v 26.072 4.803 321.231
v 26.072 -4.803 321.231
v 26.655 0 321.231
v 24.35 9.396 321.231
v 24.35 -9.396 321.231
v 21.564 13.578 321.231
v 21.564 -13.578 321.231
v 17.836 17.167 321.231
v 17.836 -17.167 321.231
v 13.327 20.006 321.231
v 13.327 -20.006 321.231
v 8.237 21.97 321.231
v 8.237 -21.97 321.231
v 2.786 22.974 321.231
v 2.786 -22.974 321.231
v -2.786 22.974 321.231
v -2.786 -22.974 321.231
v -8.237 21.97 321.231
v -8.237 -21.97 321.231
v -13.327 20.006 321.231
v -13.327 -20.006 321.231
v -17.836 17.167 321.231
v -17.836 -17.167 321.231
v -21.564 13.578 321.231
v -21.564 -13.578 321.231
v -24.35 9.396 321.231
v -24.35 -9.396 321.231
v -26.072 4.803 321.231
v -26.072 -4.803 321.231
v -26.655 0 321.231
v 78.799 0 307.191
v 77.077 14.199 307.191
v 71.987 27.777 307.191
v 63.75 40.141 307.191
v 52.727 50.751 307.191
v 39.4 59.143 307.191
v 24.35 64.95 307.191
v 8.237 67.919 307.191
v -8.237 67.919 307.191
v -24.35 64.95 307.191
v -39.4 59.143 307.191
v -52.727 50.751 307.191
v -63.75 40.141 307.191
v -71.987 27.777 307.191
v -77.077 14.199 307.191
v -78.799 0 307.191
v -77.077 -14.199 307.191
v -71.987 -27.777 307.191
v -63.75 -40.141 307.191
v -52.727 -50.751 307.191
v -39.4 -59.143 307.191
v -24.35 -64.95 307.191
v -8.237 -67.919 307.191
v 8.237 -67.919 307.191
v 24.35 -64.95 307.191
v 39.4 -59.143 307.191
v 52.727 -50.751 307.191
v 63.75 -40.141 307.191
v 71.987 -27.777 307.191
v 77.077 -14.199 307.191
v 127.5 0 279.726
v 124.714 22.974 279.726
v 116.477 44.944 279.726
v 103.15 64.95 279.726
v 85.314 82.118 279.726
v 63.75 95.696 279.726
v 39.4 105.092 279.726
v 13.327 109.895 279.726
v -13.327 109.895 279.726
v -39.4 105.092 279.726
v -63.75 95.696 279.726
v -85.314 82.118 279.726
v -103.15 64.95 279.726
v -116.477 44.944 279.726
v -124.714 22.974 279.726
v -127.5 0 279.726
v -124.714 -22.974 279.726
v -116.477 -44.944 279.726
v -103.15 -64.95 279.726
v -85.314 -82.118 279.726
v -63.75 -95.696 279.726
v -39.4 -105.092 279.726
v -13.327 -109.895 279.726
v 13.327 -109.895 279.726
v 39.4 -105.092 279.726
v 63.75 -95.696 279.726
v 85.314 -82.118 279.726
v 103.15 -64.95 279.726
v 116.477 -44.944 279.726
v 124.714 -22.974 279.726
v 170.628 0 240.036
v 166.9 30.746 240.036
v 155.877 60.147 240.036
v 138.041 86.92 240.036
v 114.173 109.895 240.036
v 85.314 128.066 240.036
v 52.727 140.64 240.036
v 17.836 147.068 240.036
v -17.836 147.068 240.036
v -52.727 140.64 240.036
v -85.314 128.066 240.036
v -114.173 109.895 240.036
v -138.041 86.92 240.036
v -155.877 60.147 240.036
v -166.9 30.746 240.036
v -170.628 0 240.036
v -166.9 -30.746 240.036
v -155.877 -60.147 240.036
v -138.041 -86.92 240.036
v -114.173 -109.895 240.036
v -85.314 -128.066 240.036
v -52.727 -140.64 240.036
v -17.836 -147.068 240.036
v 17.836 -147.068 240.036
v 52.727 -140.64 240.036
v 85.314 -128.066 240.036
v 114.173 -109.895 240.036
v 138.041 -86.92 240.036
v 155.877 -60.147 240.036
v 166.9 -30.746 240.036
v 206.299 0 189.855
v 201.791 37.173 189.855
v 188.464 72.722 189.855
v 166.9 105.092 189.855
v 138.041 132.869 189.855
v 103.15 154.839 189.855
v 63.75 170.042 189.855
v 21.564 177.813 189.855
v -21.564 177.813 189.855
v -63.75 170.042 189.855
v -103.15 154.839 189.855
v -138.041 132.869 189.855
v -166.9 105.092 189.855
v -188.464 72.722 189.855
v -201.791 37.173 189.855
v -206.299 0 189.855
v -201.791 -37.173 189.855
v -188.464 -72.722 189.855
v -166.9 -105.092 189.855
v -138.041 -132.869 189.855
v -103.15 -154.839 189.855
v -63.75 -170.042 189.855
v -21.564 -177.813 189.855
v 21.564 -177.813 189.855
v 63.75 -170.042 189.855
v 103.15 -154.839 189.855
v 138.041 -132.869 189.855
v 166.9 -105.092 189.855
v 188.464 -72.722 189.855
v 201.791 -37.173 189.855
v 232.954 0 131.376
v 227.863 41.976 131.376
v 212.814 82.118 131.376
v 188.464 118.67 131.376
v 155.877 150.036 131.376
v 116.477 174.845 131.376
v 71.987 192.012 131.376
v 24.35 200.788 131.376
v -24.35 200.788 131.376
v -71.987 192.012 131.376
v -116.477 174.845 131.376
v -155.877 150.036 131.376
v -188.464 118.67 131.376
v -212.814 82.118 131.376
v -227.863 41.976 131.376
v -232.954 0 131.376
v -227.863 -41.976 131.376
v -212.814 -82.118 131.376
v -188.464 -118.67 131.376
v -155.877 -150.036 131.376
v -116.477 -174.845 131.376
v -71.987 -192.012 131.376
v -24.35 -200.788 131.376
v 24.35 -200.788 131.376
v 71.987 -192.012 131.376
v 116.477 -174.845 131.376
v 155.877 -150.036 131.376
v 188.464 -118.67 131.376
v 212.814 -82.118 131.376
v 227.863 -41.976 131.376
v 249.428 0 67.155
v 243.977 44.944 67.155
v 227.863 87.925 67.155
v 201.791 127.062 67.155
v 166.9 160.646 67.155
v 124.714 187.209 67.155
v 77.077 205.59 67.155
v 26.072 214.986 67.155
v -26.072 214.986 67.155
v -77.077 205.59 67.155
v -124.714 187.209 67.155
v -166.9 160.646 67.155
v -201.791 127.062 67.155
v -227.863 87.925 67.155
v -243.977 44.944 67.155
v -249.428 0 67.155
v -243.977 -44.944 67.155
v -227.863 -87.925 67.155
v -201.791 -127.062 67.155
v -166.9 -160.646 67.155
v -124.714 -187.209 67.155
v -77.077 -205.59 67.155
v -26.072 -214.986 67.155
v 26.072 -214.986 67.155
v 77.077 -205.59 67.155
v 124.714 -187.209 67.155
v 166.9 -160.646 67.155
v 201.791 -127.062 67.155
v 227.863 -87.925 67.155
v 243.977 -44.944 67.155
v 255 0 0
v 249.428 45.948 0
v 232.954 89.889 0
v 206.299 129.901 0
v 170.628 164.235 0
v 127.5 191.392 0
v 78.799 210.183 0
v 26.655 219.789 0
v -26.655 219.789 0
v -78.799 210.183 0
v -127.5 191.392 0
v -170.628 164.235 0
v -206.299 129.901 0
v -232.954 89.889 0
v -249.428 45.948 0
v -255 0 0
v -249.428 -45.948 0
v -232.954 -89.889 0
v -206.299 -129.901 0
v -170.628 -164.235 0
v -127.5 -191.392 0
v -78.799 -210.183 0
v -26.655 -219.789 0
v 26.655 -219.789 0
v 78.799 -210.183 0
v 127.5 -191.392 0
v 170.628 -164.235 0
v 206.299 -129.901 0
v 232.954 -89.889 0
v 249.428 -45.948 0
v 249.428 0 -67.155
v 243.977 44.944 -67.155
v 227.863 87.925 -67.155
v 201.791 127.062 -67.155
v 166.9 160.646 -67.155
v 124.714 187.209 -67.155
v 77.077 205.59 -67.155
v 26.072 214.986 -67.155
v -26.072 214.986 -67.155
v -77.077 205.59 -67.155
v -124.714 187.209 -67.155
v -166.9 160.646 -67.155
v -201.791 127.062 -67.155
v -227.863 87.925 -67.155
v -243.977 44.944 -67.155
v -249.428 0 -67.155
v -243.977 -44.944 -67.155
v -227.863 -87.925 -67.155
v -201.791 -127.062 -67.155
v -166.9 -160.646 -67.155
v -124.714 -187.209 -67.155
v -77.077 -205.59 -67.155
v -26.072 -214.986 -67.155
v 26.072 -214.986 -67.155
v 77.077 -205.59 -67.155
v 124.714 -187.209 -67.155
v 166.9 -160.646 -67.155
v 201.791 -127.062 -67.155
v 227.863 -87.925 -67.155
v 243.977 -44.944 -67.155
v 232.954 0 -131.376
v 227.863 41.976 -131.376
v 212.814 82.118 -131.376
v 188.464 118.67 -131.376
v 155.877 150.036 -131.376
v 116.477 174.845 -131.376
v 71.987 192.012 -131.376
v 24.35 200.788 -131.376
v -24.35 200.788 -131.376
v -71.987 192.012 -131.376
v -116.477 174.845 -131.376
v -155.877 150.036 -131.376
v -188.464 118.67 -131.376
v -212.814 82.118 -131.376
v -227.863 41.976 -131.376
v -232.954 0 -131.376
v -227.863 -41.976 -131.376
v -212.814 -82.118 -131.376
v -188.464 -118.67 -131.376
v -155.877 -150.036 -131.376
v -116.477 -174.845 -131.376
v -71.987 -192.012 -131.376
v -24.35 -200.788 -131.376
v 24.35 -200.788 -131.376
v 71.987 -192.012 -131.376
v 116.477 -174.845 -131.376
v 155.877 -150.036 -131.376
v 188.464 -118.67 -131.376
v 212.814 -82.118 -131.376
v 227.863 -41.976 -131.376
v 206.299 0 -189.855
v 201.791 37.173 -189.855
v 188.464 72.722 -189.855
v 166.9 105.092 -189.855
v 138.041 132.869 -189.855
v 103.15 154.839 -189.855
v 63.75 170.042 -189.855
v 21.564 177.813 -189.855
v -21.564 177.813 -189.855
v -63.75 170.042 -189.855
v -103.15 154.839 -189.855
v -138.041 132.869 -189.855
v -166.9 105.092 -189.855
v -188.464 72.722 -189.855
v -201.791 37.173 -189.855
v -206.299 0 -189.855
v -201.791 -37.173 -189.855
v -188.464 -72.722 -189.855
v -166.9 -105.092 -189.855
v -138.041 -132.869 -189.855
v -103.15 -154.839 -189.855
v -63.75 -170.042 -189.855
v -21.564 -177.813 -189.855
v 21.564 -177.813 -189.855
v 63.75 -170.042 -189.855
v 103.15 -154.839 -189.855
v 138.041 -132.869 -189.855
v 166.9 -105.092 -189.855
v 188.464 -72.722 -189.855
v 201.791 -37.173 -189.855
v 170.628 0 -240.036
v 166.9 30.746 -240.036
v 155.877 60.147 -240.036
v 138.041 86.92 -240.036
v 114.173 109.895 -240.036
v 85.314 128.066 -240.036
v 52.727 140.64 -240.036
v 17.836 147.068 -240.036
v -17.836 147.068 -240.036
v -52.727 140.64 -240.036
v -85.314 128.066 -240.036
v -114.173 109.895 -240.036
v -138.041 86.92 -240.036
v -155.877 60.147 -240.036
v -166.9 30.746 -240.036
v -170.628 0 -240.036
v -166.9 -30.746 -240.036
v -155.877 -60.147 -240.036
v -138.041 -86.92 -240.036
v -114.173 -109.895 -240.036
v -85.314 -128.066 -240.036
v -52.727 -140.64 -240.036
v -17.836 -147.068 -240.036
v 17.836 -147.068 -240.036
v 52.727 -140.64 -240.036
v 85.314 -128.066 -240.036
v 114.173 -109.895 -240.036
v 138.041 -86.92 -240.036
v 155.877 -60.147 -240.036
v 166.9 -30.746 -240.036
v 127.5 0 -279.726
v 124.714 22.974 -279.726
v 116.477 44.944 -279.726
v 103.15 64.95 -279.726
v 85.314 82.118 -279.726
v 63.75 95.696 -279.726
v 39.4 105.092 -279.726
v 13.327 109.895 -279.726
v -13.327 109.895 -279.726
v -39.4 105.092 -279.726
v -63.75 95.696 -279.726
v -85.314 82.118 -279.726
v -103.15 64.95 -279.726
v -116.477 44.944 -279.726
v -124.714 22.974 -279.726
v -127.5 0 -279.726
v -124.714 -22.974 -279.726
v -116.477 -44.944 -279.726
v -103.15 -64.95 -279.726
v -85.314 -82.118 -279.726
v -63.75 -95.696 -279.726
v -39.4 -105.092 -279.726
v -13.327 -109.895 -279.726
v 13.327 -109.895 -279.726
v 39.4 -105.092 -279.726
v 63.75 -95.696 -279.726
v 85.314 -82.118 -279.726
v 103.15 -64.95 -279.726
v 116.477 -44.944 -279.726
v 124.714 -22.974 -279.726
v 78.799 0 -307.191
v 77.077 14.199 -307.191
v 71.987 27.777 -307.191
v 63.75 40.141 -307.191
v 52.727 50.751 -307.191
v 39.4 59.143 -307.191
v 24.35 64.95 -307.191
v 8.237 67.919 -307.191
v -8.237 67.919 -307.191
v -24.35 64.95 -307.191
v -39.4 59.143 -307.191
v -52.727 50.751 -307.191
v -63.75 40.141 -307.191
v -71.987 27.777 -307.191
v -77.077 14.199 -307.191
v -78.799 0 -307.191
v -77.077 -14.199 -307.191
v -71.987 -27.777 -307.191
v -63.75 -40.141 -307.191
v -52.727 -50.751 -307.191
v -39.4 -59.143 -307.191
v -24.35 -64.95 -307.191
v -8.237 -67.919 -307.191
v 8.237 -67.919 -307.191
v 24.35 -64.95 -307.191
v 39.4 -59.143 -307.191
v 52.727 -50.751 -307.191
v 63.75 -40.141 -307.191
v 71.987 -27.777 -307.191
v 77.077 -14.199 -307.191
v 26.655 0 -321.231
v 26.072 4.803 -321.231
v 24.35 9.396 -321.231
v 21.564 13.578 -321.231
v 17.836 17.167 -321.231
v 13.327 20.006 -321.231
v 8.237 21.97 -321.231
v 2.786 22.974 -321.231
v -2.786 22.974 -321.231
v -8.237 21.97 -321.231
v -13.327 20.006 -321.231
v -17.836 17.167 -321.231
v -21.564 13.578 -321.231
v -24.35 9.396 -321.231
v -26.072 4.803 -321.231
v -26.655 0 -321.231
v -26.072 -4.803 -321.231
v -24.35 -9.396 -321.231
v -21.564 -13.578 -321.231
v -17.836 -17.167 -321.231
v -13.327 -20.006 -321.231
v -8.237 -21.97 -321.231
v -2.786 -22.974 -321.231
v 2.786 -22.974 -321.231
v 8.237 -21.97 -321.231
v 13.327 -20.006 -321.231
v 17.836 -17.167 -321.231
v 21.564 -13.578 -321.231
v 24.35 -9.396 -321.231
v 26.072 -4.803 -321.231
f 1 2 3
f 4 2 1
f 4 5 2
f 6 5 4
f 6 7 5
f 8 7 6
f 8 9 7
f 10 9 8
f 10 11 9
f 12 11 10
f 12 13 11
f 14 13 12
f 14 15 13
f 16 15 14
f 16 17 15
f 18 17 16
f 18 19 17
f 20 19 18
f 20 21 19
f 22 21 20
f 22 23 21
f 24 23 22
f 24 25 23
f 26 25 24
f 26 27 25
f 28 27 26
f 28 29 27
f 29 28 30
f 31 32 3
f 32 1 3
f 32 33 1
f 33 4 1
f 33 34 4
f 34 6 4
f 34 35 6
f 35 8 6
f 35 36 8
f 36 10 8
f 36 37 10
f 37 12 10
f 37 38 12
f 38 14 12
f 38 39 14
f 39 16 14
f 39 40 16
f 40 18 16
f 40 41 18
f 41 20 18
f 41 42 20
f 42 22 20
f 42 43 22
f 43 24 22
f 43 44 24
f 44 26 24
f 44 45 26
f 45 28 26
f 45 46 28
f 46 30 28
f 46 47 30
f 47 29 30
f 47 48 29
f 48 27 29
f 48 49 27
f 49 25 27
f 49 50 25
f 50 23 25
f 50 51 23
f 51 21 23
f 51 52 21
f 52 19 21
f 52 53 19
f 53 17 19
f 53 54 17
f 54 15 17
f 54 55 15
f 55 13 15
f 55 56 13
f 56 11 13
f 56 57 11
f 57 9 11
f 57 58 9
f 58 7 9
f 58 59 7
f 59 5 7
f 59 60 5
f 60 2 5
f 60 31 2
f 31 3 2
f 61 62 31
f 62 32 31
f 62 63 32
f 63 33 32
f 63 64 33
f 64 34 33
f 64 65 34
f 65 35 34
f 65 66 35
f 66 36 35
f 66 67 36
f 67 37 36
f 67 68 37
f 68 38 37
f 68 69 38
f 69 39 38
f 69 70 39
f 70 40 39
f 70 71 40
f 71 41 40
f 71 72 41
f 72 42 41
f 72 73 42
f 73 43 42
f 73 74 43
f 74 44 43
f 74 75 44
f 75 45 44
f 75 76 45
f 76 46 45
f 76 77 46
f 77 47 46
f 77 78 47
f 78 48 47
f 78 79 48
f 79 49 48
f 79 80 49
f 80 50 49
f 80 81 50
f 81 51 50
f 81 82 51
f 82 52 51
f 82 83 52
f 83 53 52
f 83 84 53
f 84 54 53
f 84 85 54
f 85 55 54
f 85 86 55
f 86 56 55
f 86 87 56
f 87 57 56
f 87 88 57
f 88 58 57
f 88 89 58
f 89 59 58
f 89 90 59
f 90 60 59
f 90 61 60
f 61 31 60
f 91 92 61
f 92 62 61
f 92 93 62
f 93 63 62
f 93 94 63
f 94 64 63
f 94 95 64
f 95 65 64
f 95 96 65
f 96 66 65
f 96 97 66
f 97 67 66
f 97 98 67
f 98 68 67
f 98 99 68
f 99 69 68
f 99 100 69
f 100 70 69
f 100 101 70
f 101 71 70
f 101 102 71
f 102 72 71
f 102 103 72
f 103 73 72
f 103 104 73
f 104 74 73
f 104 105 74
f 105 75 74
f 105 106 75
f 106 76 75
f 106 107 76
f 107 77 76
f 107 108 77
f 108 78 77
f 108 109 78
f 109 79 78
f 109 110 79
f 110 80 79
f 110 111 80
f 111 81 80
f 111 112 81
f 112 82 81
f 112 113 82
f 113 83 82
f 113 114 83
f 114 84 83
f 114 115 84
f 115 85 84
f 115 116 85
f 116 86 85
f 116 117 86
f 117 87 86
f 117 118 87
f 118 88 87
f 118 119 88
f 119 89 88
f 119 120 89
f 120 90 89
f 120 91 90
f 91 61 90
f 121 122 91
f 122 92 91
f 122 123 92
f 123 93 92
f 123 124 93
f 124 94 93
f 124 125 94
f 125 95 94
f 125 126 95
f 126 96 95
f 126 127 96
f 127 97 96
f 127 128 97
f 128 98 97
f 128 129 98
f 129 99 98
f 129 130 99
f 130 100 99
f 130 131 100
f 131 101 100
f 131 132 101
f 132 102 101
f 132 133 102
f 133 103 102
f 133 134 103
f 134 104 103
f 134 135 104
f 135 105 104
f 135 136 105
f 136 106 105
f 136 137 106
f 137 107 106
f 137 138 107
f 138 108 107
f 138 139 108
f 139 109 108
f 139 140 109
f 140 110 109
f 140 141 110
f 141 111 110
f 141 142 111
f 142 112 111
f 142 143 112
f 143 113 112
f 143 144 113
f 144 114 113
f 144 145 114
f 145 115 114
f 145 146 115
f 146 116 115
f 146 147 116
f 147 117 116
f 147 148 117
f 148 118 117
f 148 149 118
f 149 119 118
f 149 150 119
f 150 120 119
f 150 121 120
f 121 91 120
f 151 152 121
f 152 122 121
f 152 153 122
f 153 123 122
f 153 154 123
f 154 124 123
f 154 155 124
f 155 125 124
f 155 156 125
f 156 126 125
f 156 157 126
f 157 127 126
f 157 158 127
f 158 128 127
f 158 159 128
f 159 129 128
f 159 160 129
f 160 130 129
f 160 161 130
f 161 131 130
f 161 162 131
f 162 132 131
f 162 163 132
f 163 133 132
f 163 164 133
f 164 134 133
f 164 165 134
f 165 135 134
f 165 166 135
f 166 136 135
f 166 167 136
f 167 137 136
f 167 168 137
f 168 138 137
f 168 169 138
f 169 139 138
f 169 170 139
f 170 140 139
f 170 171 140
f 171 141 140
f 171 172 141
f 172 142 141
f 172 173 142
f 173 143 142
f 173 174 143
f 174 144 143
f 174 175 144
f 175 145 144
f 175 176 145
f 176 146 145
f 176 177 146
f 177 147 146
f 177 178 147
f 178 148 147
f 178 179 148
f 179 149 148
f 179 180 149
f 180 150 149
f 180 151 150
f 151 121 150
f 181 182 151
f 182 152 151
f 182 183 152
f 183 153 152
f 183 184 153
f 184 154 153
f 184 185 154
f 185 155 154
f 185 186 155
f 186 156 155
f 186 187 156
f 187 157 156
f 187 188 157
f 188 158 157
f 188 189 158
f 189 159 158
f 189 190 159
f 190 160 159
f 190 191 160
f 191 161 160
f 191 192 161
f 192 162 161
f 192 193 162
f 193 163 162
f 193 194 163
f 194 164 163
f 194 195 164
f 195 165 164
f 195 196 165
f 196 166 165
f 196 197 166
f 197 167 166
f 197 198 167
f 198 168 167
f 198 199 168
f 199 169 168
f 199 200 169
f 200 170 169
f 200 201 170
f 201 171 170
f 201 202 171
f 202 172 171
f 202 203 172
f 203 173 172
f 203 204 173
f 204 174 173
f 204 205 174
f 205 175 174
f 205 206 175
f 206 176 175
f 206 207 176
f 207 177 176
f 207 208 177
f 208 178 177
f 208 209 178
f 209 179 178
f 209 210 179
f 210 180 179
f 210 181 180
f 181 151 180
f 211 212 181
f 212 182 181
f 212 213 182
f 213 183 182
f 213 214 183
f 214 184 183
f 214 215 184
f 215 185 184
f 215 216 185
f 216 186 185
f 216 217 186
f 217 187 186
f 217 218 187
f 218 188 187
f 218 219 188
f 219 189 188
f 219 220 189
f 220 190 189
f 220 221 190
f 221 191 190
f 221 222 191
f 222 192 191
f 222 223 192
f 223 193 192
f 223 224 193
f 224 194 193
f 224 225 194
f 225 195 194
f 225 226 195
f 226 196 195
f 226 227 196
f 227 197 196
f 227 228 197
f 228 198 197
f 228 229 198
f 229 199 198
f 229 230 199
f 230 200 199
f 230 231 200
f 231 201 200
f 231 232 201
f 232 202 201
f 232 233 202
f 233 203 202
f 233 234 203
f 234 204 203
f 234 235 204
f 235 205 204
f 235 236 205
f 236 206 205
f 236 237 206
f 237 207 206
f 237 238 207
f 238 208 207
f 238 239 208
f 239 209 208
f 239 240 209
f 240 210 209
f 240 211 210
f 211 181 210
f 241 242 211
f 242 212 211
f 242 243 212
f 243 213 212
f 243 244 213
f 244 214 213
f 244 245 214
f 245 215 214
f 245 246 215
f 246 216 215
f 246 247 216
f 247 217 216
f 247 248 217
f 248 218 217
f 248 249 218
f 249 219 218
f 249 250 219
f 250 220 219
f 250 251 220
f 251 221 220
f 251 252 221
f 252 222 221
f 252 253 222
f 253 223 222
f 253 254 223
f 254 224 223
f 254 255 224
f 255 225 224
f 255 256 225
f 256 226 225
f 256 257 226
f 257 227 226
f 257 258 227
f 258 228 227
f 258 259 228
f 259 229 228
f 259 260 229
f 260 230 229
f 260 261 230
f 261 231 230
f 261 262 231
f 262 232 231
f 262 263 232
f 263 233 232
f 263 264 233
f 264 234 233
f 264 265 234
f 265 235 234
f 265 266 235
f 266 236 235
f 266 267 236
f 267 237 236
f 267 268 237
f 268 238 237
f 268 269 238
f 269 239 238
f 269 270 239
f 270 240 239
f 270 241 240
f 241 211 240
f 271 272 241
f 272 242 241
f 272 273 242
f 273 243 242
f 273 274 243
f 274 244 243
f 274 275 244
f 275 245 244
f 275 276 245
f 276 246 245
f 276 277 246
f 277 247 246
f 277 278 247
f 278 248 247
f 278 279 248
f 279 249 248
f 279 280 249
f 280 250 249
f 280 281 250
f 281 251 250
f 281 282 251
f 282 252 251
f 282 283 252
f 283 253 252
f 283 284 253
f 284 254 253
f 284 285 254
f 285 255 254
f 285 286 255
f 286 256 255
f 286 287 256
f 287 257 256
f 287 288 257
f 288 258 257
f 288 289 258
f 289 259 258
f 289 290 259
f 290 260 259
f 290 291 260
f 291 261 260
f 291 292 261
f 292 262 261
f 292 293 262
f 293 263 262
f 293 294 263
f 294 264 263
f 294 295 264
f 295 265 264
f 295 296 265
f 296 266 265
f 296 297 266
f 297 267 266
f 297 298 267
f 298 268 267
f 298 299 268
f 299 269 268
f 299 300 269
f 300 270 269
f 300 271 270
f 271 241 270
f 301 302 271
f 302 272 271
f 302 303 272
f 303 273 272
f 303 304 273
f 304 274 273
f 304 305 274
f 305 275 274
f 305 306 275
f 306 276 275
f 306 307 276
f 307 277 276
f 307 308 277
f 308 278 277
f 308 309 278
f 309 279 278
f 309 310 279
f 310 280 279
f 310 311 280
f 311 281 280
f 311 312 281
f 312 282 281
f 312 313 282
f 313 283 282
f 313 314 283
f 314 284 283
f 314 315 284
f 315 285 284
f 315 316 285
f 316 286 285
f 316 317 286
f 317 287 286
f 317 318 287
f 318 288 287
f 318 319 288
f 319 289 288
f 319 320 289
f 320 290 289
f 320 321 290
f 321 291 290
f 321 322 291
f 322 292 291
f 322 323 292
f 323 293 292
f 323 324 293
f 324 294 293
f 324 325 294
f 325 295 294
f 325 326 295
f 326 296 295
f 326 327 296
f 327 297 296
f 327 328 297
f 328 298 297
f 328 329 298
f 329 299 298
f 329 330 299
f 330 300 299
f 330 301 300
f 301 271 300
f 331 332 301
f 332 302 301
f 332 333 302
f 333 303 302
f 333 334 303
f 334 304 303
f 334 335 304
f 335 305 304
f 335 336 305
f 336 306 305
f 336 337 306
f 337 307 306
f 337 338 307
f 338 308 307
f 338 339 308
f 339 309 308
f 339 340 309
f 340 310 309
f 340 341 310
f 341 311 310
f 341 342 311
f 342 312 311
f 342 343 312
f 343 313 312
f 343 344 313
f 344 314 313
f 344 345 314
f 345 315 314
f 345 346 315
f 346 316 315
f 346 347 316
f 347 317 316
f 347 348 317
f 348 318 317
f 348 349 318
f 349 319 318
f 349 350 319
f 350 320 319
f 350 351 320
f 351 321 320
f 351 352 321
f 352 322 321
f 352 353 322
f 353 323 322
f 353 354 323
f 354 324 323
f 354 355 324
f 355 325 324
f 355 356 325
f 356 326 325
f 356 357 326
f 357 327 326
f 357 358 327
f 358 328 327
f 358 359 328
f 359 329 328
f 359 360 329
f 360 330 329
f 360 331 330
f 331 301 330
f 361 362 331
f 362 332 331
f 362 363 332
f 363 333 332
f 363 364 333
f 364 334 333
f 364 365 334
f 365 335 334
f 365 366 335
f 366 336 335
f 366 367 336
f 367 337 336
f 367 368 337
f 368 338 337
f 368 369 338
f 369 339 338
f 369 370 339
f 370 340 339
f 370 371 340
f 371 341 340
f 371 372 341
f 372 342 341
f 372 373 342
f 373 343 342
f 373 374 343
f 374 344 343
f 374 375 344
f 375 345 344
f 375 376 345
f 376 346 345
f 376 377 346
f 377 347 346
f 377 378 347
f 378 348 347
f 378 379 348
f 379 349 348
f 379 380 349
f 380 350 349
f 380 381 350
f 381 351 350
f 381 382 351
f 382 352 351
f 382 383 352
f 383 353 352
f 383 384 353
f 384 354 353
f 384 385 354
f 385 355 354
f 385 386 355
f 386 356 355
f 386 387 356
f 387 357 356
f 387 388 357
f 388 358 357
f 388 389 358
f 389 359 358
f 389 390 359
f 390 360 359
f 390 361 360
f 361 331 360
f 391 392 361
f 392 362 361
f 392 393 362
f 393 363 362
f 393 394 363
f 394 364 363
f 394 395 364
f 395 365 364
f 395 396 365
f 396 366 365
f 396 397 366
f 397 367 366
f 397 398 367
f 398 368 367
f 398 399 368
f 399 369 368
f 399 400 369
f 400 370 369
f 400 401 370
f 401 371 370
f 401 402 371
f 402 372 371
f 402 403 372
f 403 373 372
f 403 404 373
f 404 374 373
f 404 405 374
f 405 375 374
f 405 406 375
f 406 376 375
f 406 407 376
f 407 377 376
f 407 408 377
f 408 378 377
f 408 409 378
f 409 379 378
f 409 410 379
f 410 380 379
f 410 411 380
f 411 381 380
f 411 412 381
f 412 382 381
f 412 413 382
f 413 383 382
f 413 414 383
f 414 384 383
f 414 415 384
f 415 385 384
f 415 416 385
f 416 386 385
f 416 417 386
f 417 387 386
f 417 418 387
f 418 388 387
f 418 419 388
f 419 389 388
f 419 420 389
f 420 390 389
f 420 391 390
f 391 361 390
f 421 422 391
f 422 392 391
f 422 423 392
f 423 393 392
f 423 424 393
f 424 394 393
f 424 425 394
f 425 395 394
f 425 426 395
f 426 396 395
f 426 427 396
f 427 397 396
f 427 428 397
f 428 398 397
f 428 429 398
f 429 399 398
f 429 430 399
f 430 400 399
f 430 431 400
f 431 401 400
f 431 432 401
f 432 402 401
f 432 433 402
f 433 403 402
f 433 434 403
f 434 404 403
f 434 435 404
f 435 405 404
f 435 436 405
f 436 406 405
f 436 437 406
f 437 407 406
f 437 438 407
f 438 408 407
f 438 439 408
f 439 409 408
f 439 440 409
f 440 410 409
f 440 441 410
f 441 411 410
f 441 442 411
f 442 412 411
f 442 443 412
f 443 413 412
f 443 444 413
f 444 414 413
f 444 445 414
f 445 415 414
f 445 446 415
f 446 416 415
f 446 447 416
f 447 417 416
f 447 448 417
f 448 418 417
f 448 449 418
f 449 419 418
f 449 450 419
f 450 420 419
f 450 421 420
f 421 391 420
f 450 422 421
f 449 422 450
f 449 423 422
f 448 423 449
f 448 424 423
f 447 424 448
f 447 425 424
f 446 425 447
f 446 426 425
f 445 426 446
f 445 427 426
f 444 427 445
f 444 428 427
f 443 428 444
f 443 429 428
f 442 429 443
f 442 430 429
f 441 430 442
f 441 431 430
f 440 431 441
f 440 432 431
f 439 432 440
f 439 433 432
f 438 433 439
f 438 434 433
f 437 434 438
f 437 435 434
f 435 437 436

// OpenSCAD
// Generated by SolidPython 1.0.1 on 2020-07-29 00:46:52


scale(v = [15, 13, 19]) {
	sphere(r = 17);
}
/***********************************************
*********      SolidPython code:      **********
************************************************
 
# import packages: SolidPython
from solid import *
from solid.utils import *
from itertools import chain, combinations, permutations


class Resize:

    def __init__(self, scad_file):
        self.scad_file = scad_file
        #self.scad_file = import_scad(scad_file)
        # cone/cylinder param:
        self.r1 = 0
        self.r2 = 0
        self.h = 0
        # rectangular prism param:
        self.w = 0
        self.l = 0
        # ellipse param:
        self.r = 0

    # import OpenScad code (file name corresponds to shape)


    # classify shape + parameters
    def assign(self, param1, param2, param3):
        if self.scad_file == 'cone.scad':
            self.r1 = param1
            self.r2 = param2
            self.h = param3
        elif self.scad_file == 'cylinder.scad':
            self.r1 = param1
            self.r2 = param2
            self.h = param3
        elif self.scad_file == 'rectangularPrism.scad':
            self.h = param1
            self.l = param2
            self.w = param3
        else:
            self.r = param1
            self.h = param2

    # resize parameters
    def iterate(self):
        x = range(3, 20, 2)
        i = 1
        if self.scad_file == 'cone.scad':
            tempList = list(permutations(x, 2))
            for temp in tempList:
                param1 = temp[0]
                param2 = temp[1]
                filepath = 'produced_scad_files/' + 'cone' + str(param1) + '_' + str(param2) + '_' + '.scad'
                scad_render_to_file(cylinder(h=param1, r1=param2, r2=0), filepath)

        elif self.scad_file == 'cylinder.scad':
            tempList = list(permutations(x, 3))
            for temp in tempList:
                param1 = temp[0]
                param2 = temp[1]
                filepath = 'produced_scad_files/' + 'cylinder' + str(param1) + '_' + str(param2) + '_' + '.scad'
                scad_render_to_file(cylinder(h=param1, r1=param2, r2=param2), filepath)

        elif self.scad_file == 'rectangularPrism.scad':
            tempList = list(permutations(x, 3))
            for temp in tempList:
                param1 = temp[0]
                param2 = temp[1]
                param3 = temp[2]
                filepath = 'produced_scad_files/' + 'rectangularPrism' + str(param1) + '_' + str(param2) + '_' + str(
                    param3) + '.scad'
                scad_render_to_file(cube(size=(param1, param2, param3)), filepath)

        elif self.scad_file == 'ellipse.scad':
            tempList = list(permutations(x, 4))
            for temp in tempList:
                param1 = temp[0]
                param2 = temp[1]
                param3 = temp[2]
                param4 = temp[3]
                filepath = 'produced_scad_files/' + 'ellipse' + str(param1) + '_' + str(param2) + '_' + str(param3) + '_' + str(param4) + '.scad'
                scad_render_to_file(scale([param1, param2, param3])(sphere(r=param4)), filepath)

    def render_to_scadfile(self):
        scad_render_to_file(scad, 'example.scad') 
 
************************************************/
